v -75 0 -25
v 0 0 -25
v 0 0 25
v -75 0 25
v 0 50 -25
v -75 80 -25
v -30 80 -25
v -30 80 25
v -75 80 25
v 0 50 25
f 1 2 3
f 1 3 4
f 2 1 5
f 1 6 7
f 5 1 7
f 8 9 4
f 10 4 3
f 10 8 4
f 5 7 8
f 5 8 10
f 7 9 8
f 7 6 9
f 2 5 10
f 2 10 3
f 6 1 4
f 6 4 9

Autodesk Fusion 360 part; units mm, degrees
sketch "Sketch1" plane through (0, 0, 0) normal (0, 0, 1) x (1, 0, 0)
  line L0 (0, 0) -> (-75, 0)
  line L1 (-75, 0) -> (-75, 80)
  line L2 (-75, 80) -> (-30, 80)
  line L3 (-30, 80) -> (0, 50)
  line L4 (0, 50) -> (0, 0)
  dimension "d1" = 75
  dimension "d2" = 80
  dimension "d3" = 135
  dimension "d4" = 50
extrude "Extrude1" add sketch "Sketch1" along normal mid plane 50
